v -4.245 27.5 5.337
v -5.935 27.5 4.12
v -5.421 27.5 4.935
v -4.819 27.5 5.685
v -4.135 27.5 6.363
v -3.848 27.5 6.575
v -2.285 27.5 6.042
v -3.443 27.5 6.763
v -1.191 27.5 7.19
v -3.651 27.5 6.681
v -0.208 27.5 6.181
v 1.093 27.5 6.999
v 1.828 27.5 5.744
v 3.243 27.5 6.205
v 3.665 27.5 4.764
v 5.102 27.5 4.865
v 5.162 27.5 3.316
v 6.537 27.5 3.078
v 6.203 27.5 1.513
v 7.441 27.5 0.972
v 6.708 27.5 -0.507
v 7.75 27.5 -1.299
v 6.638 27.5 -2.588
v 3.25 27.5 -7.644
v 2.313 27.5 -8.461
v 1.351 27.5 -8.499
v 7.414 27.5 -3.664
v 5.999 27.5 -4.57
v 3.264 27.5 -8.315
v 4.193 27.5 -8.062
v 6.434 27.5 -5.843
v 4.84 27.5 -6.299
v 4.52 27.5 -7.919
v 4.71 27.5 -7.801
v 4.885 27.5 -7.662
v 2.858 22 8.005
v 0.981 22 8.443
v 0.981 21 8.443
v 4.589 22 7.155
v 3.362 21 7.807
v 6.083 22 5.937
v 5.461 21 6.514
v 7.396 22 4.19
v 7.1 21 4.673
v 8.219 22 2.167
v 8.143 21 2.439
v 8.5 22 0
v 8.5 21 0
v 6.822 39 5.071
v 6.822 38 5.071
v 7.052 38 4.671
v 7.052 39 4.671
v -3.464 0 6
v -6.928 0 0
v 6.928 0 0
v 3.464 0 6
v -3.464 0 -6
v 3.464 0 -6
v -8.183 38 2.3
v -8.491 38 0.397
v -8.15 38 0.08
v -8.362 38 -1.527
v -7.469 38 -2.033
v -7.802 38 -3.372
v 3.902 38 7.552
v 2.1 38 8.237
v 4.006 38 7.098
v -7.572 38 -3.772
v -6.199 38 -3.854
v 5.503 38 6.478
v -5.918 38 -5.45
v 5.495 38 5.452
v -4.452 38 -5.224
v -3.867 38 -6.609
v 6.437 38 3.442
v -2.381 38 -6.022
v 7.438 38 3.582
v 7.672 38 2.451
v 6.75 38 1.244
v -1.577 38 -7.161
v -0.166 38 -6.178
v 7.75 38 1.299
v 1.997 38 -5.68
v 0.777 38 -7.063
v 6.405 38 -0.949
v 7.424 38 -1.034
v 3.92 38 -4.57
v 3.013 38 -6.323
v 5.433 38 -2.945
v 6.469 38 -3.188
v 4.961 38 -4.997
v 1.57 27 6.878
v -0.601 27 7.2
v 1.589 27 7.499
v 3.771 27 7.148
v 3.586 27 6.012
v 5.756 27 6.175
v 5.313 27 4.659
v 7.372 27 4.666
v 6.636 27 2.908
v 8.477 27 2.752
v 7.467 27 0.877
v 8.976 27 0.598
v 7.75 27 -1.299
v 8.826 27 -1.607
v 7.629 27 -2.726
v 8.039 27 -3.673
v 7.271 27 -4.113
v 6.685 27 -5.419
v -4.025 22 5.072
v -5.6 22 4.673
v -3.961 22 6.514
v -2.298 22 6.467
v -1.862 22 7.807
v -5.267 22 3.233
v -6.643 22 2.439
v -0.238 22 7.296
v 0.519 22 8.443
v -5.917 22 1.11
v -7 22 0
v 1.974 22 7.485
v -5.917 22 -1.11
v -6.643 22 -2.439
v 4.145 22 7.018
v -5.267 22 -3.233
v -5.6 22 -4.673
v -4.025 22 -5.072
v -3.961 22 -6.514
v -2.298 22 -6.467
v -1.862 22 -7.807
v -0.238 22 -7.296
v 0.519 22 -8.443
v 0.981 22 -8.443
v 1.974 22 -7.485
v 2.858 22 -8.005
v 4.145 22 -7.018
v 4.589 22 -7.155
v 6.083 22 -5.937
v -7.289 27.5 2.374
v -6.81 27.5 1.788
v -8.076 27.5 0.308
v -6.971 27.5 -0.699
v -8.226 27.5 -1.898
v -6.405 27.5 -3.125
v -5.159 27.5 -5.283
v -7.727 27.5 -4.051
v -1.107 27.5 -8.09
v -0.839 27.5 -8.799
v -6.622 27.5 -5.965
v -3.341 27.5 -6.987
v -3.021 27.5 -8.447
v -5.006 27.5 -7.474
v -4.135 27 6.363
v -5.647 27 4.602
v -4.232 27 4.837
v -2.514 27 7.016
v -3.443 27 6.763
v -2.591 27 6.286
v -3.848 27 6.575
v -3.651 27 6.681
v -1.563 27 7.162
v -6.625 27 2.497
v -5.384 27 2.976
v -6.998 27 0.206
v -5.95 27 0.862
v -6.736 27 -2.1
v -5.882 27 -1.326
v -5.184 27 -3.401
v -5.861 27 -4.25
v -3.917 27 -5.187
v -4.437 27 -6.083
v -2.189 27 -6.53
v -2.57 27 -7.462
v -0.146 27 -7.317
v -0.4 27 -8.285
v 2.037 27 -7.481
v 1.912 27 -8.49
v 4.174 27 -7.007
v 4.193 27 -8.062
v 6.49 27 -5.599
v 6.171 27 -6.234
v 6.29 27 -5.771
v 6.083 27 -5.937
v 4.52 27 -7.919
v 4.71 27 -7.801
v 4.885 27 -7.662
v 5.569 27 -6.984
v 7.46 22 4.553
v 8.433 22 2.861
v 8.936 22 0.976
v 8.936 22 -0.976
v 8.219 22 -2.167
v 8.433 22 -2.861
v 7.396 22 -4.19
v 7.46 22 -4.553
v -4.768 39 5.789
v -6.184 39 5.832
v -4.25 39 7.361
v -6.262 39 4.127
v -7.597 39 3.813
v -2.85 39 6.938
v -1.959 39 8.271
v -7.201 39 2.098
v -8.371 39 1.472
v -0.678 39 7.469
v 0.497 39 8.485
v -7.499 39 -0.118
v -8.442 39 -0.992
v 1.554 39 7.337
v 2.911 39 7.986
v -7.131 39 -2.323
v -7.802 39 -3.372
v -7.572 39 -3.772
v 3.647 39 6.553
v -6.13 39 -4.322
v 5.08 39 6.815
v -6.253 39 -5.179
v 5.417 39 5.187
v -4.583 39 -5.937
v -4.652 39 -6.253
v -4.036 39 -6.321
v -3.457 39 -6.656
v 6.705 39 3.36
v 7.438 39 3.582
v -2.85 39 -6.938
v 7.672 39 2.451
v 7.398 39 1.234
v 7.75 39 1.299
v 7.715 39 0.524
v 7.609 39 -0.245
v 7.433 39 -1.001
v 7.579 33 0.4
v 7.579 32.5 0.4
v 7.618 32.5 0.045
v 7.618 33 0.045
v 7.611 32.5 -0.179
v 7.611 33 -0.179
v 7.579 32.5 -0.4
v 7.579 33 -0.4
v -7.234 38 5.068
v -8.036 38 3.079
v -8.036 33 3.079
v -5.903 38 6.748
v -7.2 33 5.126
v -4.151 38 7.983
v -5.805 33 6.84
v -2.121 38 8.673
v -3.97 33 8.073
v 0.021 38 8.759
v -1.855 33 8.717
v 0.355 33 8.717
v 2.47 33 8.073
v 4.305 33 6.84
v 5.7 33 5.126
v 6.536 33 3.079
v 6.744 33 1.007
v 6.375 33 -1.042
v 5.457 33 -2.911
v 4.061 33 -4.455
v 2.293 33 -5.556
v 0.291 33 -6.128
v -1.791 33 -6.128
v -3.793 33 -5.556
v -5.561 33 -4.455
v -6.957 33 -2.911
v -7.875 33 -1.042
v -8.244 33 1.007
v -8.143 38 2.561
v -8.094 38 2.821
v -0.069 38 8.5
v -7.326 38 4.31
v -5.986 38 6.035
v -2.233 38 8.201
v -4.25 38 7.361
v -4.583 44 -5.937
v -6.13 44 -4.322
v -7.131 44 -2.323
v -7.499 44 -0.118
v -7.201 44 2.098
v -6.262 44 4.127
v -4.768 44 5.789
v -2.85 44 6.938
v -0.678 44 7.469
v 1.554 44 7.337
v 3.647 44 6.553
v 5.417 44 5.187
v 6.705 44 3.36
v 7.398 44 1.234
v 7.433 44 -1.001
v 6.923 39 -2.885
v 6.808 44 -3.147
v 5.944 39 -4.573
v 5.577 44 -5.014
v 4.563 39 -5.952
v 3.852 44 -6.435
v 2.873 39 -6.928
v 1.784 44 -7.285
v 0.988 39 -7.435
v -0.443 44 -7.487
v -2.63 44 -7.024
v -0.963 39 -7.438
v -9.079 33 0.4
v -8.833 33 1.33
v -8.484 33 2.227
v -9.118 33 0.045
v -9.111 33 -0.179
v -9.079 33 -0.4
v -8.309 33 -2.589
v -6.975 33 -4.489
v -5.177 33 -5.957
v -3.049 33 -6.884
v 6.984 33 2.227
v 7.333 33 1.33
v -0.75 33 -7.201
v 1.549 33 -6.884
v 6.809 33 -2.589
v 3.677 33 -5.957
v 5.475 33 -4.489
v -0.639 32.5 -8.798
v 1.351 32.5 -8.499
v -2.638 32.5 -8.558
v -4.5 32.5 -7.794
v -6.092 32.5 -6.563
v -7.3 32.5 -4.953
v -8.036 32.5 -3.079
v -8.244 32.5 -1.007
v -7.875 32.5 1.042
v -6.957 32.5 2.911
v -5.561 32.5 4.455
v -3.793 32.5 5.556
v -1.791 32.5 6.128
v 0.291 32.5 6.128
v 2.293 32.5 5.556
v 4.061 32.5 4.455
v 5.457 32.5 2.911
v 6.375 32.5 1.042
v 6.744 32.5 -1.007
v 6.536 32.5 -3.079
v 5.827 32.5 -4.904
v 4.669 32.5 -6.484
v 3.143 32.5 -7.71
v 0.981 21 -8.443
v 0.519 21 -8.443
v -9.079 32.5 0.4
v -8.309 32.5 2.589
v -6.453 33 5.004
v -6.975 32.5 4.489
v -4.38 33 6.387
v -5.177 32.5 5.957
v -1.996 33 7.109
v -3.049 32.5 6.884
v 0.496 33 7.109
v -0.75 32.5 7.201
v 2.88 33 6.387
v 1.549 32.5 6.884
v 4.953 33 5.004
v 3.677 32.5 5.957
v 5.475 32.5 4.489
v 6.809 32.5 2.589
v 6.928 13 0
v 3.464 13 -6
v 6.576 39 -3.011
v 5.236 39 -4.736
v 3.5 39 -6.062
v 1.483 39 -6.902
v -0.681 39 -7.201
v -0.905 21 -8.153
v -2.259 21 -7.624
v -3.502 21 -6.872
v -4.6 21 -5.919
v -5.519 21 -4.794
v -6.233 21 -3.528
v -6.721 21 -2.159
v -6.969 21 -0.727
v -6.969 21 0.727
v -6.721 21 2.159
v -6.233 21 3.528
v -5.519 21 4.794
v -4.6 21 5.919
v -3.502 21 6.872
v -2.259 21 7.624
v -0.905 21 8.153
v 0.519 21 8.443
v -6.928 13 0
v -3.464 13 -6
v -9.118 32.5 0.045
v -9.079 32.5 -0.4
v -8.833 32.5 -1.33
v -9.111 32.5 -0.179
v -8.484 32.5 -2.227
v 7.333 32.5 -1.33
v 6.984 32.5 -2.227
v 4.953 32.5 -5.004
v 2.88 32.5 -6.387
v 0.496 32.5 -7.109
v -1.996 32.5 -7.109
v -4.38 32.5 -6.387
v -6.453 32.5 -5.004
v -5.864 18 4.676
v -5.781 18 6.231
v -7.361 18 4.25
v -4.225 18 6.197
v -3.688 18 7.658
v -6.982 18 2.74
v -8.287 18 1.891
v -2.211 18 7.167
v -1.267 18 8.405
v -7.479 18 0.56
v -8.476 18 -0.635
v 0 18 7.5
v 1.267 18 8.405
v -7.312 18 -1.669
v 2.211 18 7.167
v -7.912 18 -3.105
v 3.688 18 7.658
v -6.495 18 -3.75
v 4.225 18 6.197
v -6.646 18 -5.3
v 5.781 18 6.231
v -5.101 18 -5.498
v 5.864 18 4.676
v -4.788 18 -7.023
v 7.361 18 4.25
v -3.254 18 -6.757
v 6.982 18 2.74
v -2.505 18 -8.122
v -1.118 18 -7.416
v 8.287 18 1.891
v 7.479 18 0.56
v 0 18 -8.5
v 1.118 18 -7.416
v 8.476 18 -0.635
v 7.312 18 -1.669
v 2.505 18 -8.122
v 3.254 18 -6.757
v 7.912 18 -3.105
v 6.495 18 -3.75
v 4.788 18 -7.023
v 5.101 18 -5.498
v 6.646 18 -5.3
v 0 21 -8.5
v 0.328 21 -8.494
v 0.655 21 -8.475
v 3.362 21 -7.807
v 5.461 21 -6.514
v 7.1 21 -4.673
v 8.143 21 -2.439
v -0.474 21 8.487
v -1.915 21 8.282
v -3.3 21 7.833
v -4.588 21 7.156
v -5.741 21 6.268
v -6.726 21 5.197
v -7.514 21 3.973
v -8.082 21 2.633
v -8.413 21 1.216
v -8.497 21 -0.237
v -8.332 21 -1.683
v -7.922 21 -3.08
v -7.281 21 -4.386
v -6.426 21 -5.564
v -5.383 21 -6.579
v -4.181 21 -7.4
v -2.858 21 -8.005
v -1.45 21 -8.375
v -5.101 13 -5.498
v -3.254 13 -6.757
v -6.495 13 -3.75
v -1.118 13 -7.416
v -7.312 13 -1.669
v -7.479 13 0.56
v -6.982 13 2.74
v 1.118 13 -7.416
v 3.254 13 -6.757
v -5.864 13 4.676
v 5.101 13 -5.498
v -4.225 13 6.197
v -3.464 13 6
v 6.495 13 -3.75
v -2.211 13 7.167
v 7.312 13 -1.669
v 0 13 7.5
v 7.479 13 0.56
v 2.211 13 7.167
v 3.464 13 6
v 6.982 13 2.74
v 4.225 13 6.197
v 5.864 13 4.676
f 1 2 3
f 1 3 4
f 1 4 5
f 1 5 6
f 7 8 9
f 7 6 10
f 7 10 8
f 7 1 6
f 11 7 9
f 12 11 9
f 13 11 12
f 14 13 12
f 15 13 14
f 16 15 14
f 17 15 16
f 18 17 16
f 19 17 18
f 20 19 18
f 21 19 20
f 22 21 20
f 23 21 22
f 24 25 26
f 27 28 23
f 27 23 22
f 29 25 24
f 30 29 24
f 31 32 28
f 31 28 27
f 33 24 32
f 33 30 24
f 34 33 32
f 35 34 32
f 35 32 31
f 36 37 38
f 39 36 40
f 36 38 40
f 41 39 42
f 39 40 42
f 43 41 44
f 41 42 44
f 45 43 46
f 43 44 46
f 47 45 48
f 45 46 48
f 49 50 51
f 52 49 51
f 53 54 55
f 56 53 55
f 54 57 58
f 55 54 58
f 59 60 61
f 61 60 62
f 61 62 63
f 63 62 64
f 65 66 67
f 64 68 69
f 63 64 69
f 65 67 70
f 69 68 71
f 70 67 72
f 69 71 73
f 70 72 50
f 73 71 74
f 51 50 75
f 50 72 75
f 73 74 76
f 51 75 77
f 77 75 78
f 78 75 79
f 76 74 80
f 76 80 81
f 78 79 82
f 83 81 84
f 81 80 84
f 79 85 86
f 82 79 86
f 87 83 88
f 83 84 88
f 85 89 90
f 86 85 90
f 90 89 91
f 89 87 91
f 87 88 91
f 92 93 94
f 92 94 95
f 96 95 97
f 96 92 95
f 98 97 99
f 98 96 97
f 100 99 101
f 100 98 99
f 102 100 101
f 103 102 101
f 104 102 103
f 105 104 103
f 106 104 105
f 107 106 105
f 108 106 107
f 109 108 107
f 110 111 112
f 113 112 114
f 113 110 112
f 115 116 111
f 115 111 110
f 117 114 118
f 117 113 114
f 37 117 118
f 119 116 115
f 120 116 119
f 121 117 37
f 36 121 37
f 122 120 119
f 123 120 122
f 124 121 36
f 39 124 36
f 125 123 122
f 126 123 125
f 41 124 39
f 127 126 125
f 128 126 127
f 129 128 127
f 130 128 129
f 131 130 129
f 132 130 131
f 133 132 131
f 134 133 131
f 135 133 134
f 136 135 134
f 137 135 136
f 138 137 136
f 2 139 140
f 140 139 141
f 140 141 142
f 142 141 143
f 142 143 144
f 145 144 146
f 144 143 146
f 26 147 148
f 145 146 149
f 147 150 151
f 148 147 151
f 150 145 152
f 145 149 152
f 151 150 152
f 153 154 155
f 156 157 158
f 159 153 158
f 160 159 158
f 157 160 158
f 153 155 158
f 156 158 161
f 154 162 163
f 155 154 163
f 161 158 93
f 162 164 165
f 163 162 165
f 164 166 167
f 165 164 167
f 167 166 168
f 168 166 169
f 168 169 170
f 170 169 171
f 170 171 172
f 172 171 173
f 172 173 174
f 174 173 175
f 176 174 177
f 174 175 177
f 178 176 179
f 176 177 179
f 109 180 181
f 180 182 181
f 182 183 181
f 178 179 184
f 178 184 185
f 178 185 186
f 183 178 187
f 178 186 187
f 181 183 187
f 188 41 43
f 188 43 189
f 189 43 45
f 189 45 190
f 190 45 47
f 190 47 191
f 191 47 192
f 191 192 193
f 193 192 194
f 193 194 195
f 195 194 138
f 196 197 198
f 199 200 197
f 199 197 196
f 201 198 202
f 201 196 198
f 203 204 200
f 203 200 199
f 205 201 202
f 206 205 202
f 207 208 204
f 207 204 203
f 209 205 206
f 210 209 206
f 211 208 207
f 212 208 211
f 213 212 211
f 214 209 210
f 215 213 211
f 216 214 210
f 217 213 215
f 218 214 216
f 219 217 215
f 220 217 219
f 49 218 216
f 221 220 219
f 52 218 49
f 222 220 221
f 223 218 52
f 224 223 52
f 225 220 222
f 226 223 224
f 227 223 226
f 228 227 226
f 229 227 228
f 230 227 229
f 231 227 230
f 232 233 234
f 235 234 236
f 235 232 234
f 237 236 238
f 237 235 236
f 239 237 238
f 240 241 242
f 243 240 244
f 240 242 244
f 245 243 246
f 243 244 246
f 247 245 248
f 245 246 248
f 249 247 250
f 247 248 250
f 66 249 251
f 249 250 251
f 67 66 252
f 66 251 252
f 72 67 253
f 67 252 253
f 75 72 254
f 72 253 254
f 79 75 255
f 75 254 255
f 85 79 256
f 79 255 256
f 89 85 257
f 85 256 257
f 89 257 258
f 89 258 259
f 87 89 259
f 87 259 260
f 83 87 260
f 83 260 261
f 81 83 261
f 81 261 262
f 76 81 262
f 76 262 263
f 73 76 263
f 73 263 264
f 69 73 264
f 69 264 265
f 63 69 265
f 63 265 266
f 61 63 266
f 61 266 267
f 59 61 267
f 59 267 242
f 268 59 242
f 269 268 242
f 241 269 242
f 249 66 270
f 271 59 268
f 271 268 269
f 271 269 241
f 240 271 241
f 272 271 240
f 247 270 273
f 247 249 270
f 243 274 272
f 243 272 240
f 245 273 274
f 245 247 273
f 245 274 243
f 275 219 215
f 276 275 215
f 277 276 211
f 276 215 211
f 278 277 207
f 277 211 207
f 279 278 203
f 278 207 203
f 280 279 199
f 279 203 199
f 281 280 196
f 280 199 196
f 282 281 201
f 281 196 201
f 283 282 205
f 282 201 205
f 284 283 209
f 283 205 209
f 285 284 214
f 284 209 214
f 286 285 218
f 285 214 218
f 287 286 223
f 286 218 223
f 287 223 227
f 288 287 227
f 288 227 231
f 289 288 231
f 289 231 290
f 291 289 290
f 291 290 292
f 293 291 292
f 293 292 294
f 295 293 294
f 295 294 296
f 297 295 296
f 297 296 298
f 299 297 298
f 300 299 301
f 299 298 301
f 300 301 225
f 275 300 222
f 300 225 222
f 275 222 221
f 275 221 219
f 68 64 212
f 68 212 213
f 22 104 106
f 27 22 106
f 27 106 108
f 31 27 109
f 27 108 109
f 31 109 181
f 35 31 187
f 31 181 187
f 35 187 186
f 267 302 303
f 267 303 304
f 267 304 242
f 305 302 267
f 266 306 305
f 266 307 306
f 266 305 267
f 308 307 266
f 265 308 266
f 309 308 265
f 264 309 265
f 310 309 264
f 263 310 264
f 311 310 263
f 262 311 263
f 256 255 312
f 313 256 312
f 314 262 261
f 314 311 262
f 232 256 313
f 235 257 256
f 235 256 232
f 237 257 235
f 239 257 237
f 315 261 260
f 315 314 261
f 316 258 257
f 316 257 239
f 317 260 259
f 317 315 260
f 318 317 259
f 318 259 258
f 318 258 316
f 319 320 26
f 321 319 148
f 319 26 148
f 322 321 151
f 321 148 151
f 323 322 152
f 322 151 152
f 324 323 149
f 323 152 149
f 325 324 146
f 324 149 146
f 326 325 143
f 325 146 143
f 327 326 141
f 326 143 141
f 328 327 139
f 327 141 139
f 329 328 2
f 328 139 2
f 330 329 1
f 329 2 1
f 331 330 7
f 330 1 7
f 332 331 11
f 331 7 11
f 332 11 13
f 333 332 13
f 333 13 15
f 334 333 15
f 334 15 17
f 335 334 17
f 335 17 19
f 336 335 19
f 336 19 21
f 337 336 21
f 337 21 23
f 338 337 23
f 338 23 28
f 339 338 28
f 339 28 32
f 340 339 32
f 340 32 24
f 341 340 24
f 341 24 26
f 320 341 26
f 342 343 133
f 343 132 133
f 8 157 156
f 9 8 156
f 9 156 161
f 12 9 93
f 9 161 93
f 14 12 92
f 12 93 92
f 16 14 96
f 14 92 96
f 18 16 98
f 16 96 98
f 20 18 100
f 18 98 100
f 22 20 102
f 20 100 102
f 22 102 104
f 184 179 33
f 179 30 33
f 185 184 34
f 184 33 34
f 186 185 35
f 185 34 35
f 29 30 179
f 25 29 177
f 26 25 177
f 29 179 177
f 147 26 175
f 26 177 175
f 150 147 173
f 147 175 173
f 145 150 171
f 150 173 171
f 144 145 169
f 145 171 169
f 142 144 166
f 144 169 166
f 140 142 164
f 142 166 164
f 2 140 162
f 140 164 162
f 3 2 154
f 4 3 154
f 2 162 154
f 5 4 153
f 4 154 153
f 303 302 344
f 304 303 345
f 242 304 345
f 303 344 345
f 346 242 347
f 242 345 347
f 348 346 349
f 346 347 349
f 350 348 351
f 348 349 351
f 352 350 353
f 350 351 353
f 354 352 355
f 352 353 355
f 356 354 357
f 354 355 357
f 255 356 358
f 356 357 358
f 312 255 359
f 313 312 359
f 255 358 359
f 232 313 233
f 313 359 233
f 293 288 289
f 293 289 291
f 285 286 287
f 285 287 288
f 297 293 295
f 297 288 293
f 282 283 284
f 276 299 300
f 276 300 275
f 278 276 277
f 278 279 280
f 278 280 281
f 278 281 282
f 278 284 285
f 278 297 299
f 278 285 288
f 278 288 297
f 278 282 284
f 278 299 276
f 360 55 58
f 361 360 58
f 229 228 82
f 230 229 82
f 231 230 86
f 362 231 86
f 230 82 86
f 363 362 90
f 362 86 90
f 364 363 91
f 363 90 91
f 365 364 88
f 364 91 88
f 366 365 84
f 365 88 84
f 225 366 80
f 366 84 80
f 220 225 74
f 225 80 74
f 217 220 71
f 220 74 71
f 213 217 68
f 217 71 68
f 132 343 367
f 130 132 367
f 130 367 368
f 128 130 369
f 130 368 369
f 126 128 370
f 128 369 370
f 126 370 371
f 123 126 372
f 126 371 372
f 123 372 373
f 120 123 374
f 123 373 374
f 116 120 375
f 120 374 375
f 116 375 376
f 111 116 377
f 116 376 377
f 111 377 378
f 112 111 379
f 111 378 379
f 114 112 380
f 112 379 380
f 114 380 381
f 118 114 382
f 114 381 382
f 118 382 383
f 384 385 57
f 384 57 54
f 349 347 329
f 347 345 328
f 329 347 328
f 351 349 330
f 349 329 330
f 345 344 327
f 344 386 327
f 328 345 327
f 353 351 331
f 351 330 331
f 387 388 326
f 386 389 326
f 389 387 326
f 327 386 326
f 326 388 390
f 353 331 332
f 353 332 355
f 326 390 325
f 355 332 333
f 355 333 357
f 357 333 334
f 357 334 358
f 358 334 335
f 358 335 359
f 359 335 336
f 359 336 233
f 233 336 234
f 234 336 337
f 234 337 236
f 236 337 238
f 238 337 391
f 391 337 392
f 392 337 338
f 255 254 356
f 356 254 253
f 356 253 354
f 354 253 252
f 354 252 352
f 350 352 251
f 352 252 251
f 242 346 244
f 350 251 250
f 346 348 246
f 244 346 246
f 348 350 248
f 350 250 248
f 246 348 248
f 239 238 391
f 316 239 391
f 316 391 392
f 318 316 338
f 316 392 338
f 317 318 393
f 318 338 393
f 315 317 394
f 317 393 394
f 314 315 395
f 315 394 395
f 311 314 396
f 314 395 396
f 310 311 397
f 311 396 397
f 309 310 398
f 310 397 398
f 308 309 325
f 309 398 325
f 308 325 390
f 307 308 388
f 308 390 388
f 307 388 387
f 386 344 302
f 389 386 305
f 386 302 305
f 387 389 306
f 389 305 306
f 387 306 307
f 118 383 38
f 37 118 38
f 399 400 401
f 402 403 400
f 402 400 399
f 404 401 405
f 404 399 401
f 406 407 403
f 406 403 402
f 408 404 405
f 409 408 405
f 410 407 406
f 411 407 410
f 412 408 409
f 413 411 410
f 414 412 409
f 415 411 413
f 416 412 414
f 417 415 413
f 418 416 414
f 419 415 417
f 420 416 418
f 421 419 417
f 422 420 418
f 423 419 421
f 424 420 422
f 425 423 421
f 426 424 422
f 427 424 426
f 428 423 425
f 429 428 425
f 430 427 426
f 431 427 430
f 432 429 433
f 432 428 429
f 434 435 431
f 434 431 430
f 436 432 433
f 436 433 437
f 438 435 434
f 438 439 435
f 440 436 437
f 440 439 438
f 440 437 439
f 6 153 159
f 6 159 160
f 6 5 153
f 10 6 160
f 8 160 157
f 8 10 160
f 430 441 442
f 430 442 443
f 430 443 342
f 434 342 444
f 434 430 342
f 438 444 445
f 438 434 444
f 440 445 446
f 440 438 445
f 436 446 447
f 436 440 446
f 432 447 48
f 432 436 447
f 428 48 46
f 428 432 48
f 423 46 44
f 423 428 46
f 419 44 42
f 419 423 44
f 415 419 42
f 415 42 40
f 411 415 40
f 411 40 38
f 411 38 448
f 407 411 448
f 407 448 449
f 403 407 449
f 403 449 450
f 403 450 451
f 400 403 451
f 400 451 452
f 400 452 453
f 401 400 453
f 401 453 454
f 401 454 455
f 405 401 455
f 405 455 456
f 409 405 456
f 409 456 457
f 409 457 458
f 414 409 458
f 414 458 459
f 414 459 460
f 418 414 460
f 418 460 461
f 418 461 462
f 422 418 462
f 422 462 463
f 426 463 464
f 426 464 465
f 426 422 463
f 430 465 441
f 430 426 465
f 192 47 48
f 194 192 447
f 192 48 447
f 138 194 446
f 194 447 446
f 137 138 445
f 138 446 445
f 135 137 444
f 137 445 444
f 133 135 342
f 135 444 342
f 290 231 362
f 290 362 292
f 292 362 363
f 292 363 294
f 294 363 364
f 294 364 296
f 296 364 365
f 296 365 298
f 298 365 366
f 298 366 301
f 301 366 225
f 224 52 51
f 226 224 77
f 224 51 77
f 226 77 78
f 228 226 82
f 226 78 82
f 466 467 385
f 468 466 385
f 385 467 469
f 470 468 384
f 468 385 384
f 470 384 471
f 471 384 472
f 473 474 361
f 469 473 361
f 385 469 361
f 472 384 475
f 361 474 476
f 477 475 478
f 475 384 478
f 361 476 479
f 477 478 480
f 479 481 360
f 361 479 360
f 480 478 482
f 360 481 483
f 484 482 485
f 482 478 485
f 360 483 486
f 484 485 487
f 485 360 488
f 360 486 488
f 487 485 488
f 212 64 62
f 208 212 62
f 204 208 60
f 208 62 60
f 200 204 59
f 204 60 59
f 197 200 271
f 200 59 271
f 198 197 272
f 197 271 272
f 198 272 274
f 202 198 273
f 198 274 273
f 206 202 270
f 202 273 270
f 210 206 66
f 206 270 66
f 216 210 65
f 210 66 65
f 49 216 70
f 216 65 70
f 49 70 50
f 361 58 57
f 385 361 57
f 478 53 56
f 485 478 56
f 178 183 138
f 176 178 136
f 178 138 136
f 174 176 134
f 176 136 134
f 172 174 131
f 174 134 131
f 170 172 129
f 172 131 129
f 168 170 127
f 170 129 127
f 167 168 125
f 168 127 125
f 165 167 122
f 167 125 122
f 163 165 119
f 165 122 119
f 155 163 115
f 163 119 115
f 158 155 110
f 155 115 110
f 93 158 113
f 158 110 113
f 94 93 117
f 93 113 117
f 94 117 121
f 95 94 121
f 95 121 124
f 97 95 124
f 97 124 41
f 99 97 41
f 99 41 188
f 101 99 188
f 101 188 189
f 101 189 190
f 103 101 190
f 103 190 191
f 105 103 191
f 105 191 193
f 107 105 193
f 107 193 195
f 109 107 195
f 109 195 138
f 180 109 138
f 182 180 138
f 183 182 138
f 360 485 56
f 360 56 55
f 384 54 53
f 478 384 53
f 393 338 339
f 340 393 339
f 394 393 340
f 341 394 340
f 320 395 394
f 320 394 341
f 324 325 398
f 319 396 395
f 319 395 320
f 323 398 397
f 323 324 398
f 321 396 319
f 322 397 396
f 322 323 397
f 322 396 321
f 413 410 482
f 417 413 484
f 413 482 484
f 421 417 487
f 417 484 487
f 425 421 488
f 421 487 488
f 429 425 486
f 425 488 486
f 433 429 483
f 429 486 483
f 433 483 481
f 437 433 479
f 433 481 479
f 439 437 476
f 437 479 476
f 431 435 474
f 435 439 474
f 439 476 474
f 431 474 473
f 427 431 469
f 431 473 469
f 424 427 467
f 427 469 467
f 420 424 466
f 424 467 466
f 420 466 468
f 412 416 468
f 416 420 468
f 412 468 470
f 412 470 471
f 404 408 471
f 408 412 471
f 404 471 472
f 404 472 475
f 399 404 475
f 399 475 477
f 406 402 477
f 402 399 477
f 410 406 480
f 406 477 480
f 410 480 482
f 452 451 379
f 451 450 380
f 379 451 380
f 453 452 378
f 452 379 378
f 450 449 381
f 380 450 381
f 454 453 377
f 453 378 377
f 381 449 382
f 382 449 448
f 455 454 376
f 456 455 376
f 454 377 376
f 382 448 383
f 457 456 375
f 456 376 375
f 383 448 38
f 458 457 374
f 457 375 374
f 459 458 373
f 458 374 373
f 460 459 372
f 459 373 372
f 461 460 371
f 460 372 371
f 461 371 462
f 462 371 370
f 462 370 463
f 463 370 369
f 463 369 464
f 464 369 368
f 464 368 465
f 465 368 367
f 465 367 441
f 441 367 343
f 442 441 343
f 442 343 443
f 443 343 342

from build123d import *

# Parameters (mm, degrees)
BOSS_EXTRUDE1_DEPTH  = 13
SKETCH5_R            = 7.5
BOSS_EXTRUDE2_DEPTH  = 8
BOSS_EXTRUDE3_DEPTH  = 1
SKETCH7_R            = 7.5
BOSS_EXTRUDE4_DEPTH  = 5
BOSS_EXTRUDE5_DEPTH  = 0.5
SKETCH9_R            = 7.5
BOSS_EXTRUDE6_DEPTH  = 5
BOSS_EXTRUDE7_DEPTH  = 0.5
SKETCH12_R           = 7.5
BOSS_EXTRUDE8_DEPTH  = 5
BOSS_EXTRUDE9_DEPTH  = 1
SKETCH14_R           = 7.5
BOSS_EXTRUDE10_DEPTH = 5
FILLET1_R            = 2
BOSS_EXTRUDE11_START = 3
SKETCH15_R           = 8.5
BOSS_EXTRUDE11_DEPTH = 3


with BuildPart() as part:
    # Sketch4 → Boss-Extrude1 (new body)
    with BuildSketch(Plane(origin=(0, 0, 0), x_dir=(1, 0, 0), z_dir=(0, 1, 0))):
        Polygon((-3.464101615, 6), (-6.92820323, 0), (-3.464101615, -6), (3.464101615, -6), (6.92820323, 0), (3.464101615, 6), align=None)
    extrude(amount=BOSS_EXTRUDE1_DEPTH)

    # Sketch5 → Boss-Extrude2 (add)
    with BuildSketch(Plane(origin=(0, 13, 0), x_dir=(1, 0, 0), z_dir=(0, 1, 0))):
        Circle(SKETCH5_R)
    extrude(amount=BOSS_EXTRUDE2_DEPTH)

    # Sketch6 → Boss-Extrude3 (add)
    with BuildSketch(Plane(origin=(0, 21, 0), x_dir=(1, 0, 0), z_dir=(0, 1, 0))):
        with BuildLine():
            ThreePointArc((0.75, -8.466847111), (8.5, 0), (0.75, 8.466847111))
            ThreePointArc((0.75, 8.466847111), (-7, 0), (0.75, -8.466847111))
        make_face()
    extrude(amount=BOSS_EXTRUDE3_DEPTH)

    # Sketch7 → Boss-Extrude4 (add)
    with BuildSketch(Plane(origin=(0, 22, 0), x_dir=(1, 0, 0), z_dir=(0, 1, 0))):
        with Locations((1.5, 0)):
            Circle(SKETCH7_R)
    extrude(amount=BOSS_EXTRUDE4_DEPTH)

    # Sketch8 → Boss-Extrude5 (add)
    with BuildSketch(Plane(origin=(0, 27, 0), x_dir=(1, 0, 0), z_dir=(0, 1, 0))):
        with BuildLine():
            ThreePointArc((4.575074404, 7.924261316), (-5.861215932, 4.25), (-3.825074404, -6.625223211))
            ThreePointArc((-3.825074404, -6.625223211), (6.611215932, -2.950961894), (4.575074404, 7.924261316))
        make_face()
    extrude(amount=BOSS_EXTRUDE5_DEPTH)

    # Sketch9 → Boss-Extrude6 (add)
    with BuildSketch(Plane(origin=(0, 27.5, 0), x_dir=(1, 0, 0), z_dir=(0, 1, 0))):
        with Locations((-0.75, 1.299038106)):
            Circle(SKETCH9_R)
    extrude(amount=BOSS_EXTRUDE6_DEPTH)

    # Sketch11 → Boss-Extrude7 (add)
    with BuildSketch(Plane(origin=(0, 32.5, 0), x_dir=(1, 0, 0), z_dir=(0, 1, 0))):
        with BuildLine():
            ThreePointArc((-9.150148808, 0), (-0.75, -7.200961894), (7.650148808, 0))
            ThreePointArc((7.650148808, 0), (-0.75, 7.200961894), (-9.150148808, 0))
        make_face()
    extrude(amount=BOSS_EXTRUDE7_DEPTH)

    # Sketch12 → Boss-Extrude8 (add)
    with BuildSketch(Plane(origin=(0, 33, 0), x_dir=(1, 0, 0), z_dir=(0, 1, 0))):
        with Locations((-0.75, -1.299038106)):
            Circle(SKETCH12_R)
    extrude(amount=BOSS_EXTRUDE8_DEPTH)

    # Sketch13 → Boss-Extrude9 (add)
    with BuildSketch(Plane(origin=(0, 38, 0), x_dir=(1, 0, 0), z_dir=(0, 1, 0))):
        with BuildLine():
            ThreePointArc((6.957504688, -4.882942608), (3.5, 6.062177826), (-7.707504688, 3.583904503))
            ThreePointArc((-7.707504688, 3.583904503), (-4.25, -7.361215932), (6.957504688, -4.882942608))
        make_face()
    extrude(amount=BOSS_EXTRUDE9_DEPTH)

    # Sketch14 → Boss-Extrude10 (add)
    with BuildSketch(Plane(origin=(0, 39, 0), x_dir=(1, 0, 0), z_dir=(0, 1, 0))):
        Circle(SKETCH14_R)
    extrude(amount=BOSS_EXTRUDE10_DEPTH)

    # Fillet1
    fillet1_edges = [part.edges().sort_by_distance(p)[0] for p in [
        (0.75, 21.5, -8.466847111),
        (0.75, 21.5, 8.466847111),
        (-3.825074404, 27.25, 6.625223211),
        (4.575074404, 27.25, -7.924261316),
        (7.650148808, 32.75, 0),
        (-9.150148808, 32.75, 0),
        (-7.707504688, 38.5, -3.583904503),
        (6.957504688, 38.5, 4.882942608),
    ]]
    fillet(fillet1_edges, radius=FILLET1_R)

    # Sketch15 → Boss-Extrude11 (add)
    with BuildSketch(Plane.XZ.offset(-21).offset(BOSS_EXTRUDE11_START)):
        Circle(SKETCH15_R)
    extrude(amount=-BOSS_EXTRUDE11_DEPTH)


solid = part.part
